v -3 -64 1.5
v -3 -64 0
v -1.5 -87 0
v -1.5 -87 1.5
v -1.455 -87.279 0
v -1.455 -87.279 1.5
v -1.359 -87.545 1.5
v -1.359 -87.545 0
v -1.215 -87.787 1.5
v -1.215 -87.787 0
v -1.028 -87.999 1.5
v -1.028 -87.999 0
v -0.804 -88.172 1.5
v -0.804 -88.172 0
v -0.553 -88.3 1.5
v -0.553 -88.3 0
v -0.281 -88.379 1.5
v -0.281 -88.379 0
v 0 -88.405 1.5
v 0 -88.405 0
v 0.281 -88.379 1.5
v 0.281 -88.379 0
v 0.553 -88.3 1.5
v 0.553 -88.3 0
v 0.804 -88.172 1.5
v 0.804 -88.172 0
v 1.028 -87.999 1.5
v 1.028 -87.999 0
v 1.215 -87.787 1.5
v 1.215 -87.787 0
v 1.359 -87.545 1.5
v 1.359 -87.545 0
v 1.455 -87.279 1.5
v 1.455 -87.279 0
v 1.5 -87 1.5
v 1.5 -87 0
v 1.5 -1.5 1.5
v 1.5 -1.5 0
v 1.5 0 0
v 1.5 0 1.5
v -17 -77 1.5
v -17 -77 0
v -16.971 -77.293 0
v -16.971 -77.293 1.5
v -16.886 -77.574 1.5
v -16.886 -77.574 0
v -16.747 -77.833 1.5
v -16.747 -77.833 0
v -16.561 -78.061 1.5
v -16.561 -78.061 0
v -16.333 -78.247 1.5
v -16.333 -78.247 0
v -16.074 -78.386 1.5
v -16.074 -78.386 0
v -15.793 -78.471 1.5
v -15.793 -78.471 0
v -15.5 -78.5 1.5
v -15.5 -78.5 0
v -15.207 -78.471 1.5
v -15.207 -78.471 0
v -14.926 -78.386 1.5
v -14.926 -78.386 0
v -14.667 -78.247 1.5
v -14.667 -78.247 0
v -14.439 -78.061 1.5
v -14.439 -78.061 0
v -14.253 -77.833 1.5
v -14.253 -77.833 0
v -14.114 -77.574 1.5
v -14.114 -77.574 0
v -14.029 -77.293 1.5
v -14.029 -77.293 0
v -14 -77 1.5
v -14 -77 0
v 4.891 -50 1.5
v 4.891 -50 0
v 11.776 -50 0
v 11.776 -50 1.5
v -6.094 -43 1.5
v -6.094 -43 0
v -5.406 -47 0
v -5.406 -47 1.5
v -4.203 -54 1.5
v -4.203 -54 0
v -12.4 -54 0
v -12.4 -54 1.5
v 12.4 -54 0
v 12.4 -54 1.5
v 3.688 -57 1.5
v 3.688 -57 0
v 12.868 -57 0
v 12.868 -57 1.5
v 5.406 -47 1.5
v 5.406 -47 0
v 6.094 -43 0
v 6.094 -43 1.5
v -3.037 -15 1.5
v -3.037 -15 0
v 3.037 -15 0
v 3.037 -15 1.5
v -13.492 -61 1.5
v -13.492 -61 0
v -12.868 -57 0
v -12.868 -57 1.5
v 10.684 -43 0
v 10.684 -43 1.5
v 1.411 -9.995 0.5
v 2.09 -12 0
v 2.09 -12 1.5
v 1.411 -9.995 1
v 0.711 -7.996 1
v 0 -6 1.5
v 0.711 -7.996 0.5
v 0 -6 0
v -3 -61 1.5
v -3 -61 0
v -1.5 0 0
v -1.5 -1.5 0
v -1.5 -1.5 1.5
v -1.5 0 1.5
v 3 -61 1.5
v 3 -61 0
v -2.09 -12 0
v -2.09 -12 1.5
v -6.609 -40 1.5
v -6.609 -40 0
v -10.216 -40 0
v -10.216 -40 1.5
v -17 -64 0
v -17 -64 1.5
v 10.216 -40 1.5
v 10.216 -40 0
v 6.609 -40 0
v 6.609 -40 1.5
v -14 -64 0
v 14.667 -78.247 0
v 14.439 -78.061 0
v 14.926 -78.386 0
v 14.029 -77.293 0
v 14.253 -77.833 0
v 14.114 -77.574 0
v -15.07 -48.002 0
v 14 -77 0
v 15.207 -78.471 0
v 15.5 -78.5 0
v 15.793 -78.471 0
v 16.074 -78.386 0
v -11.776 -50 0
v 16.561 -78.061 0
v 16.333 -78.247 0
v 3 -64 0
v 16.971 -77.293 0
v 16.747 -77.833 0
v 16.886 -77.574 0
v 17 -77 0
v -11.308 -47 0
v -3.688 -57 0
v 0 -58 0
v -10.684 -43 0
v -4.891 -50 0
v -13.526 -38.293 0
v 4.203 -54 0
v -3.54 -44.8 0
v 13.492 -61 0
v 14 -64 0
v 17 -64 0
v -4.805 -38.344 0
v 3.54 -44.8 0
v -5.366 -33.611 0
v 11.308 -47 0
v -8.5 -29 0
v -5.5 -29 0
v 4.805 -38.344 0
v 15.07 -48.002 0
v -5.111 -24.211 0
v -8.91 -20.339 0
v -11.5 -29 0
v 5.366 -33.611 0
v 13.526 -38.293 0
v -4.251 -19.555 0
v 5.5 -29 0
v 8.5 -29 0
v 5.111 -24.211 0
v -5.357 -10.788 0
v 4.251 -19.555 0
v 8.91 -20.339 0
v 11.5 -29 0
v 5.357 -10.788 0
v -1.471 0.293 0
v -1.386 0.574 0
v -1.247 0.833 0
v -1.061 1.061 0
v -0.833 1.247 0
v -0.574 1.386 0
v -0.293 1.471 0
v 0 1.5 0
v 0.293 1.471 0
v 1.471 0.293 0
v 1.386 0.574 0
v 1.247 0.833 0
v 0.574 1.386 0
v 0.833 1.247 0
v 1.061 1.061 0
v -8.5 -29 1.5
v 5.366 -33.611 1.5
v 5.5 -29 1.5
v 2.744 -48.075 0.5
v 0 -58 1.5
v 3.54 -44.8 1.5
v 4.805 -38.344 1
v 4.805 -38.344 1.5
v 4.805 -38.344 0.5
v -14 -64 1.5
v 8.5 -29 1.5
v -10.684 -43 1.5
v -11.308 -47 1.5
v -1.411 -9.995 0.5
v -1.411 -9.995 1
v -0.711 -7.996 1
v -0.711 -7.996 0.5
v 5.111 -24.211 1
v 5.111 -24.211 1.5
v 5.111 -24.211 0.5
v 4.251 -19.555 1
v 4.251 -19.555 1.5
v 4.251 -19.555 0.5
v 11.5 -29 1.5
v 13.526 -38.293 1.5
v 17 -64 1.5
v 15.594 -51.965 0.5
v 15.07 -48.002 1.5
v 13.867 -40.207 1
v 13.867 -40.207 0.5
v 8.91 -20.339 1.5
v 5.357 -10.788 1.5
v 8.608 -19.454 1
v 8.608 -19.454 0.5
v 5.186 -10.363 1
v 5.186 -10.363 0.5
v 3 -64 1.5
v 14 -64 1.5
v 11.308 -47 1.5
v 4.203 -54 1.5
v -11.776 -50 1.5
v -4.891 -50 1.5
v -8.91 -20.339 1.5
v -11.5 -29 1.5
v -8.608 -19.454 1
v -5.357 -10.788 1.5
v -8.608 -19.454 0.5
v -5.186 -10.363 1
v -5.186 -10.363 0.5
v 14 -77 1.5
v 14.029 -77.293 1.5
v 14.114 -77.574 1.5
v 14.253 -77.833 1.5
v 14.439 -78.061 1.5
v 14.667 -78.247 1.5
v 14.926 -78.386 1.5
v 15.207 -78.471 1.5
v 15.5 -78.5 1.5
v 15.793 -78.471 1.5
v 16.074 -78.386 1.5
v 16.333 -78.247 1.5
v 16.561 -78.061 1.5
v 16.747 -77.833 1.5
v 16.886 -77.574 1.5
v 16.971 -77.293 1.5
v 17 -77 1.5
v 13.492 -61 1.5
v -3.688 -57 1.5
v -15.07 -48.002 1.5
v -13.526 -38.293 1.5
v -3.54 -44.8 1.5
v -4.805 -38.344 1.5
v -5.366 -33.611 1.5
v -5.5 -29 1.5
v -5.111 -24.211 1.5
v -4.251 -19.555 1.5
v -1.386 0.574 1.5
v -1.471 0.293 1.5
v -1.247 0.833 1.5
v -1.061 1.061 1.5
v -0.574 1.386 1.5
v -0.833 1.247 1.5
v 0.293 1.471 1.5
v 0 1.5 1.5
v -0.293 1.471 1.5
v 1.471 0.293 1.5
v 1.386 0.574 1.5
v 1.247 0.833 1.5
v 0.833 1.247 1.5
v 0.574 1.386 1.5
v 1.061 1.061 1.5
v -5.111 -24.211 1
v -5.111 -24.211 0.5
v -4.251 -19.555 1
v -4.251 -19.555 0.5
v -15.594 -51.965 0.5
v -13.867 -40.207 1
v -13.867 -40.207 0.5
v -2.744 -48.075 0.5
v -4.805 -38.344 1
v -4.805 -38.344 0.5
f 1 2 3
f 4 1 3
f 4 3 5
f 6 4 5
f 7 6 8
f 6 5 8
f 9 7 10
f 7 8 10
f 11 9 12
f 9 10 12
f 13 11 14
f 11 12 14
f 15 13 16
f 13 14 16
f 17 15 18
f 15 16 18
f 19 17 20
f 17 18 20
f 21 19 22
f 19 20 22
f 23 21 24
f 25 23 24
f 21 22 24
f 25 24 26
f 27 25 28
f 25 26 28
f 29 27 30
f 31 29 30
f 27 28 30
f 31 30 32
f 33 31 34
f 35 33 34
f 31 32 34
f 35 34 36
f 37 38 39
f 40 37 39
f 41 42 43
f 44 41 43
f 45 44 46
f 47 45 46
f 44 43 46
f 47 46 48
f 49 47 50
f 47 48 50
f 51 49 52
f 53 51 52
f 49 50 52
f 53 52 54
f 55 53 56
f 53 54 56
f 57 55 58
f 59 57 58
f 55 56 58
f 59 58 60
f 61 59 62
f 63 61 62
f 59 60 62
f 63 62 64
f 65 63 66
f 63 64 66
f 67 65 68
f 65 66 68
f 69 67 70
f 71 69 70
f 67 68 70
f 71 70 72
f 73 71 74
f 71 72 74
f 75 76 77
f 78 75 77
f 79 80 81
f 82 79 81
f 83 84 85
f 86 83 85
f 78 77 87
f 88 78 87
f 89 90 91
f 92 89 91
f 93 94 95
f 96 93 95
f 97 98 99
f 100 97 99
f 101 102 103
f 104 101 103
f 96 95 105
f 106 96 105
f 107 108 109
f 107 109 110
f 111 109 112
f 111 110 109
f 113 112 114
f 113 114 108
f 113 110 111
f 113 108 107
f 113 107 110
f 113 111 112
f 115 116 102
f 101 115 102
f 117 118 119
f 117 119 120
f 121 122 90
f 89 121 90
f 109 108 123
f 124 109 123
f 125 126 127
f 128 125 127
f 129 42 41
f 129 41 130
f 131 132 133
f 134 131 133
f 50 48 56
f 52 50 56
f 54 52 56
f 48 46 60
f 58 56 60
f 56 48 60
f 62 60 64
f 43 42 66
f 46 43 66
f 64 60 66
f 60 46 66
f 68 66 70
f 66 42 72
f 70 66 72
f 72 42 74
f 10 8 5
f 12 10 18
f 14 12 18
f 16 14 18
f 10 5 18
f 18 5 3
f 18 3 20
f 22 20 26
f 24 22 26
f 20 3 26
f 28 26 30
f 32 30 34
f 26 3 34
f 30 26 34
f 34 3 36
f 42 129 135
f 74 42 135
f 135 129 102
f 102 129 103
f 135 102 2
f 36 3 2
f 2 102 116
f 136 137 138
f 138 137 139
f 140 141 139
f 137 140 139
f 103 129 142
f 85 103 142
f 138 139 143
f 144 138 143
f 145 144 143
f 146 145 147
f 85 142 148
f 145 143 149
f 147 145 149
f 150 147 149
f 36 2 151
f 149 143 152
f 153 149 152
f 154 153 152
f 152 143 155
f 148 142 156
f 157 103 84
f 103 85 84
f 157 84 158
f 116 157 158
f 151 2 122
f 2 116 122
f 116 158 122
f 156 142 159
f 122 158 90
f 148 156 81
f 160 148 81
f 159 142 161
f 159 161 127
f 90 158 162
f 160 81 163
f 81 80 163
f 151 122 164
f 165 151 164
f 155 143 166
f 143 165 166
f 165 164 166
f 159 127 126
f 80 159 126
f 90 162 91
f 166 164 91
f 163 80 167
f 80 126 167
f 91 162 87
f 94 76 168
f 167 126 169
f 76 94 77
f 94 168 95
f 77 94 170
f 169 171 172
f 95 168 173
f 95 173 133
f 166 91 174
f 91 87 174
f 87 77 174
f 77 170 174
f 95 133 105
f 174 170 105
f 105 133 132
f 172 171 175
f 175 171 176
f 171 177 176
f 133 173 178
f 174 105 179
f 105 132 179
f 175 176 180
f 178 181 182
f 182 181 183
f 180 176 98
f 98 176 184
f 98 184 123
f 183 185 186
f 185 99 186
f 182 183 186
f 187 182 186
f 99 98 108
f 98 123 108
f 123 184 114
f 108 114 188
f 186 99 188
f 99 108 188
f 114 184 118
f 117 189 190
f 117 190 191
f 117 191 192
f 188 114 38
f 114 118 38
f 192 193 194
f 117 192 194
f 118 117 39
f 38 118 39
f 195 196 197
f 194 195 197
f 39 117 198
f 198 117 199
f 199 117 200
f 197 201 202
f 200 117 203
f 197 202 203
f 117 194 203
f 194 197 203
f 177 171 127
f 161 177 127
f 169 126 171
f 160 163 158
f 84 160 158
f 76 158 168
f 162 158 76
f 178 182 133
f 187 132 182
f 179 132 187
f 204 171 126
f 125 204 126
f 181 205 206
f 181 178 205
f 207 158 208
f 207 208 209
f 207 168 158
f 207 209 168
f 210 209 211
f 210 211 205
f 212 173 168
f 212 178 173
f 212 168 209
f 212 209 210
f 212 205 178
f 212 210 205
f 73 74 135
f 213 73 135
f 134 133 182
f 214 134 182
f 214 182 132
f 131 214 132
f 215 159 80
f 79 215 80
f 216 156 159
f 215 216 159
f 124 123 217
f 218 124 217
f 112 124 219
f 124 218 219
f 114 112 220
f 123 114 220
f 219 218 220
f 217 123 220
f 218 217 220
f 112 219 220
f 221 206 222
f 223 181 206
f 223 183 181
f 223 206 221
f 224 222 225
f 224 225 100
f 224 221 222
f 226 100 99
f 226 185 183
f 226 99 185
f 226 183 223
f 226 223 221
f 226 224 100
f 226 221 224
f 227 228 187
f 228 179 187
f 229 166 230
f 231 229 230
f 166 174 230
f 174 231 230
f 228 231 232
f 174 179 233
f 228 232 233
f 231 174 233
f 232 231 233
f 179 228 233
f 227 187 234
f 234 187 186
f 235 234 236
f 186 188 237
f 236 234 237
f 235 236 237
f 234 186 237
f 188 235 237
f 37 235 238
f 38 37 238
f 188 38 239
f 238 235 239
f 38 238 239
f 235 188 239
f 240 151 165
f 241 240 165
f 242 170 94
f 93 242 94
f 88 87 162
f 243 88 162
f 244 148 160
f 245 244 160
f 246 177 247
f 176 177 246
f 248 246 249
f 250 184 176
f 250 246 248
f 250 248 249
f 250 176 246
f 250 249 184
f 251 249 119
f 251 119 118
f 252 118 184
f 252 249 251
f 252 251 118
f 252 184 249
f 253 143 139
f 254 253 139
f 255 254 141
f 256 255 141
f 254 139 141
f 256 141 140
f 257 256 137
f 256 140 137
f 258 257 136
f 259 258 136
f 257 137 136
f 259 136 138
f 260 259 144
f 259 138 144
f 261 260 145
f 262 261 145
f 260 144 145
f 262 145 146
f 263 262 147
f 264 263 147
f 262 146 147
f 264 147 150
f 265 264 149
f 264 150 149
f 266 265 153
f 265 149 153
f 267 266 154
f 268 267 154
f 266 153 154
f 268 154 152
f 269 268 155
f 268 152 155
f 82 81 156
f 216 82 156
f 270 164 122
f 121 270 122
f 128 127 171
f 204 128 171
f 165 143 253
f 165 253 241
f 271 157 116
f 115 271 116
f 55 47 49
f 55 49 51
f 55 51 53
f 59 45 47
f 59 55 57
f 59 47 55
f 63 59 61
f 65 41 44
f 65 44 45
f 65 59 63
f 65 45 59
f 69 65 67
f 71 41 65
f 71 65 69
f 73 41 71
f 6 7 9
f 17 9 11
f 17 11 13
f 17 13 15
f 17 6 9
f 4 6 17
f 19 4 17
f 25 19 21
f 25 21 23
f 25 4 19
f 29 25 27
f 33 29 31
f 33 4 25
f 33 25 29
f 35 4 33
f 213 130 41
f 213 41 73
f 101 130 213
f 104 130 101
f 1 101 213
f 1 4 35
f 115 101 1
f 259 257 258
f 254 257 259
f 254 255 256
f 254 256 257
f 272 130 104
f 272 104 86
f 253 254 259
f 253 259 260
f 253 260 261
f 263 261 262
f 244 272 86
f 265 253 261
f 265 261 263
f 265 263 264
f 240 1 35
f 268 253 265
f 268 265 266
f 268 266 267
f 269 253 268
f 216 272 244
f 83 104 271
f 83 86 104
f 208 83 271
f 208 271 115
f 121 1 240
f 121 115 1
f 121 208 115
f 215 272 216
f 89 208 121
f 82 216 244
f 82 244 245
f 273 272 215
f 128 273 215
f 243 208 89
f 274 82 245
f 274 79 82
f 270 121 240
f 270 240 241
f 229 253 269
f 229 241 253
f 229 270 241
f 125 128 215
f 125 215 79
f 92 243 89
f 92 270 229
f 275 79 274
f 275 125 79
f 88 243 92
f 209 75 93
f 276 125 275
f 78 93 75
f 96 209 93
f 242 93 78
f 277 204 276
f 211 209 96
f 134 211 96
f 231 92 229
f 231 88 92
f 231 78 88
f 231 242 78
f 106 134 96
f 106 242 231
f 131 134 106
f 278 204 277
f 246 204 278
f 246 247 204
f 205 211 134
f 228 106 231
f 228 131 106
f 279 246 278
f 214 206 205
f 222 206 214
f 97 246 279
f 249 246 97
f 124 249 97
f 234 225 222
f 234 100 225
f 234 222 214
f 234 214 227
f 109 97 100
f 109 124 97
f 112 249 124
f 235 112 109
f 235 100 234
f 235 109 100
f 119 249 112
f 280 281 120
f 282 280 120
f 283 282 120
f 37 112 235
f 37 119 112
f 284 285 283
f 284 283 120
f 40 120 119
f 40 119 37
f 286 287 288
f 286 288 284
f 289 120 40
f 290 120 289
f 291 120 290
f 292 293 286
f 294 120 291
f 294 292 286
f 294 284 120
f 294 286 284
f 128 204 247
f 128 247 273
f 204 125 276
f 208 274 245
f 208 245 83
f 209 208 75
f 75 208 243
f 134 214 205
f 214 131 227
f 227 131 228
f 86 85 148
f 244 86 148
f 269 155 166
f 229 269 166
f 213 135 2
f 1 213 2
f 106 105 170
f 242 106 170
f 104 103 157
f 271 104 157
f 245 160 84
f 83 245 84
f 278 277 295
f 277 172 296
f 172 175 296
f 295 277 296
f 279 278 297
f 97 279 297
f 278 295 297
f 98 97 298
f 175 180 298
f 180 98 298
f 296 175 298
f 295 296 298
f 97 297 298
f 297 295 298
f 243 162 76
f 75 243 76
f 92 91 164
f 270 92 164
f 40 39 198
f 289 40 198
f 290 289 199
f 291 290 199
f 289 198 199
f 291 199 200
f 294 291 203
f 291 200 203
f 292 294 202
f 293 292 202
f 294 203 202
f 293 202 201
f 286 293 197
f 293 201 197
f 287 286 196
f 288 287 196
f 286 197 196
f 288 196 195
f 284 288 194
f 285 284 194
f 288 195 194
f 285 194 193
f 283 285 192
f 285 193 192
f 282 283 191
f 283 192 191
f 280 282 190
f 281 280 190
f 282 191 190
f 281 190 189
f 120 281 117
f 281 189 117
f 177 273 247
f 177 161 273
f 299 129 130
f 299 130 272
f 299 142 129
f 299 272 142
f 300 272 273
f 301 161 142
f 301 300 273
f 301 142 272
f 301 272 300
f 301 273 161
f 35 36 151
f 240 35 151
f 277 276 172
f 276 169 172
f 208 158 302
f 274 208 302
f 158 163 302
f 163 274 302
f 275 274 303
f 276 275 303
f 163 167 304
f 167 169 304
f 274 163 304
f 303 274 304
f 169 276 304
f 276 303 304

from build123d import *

# Parameters (mm, degrees)
F0_W     = 1.5
F0_H     = 1.5
F0_W_2   = 3
F0_H_2   = 13
F1_DEPTH = 1.5


with BuildPart() as f1:
    # F0 (on Top) → F1 (new body)
    with BuildSketch(Plane.XY):
        with BuildLine():
            ThreePointArc((1.5, 0), (0, 1.5), (-1.5, 0))
            Line((-1.5, 0), (0, 0))
            Line((0, 0), (1.5, 0))
        make_face()
        with Locations((-0.75, -0.75)):
            Rectangle(F0_W, F0_H)
        with Locations((0.75, -0.75)):
            Rectangle(F0_W, F0_H)
        with BuildLine():
            Line((-11.5, -29), (-1.5, -1.5))
            add(Edge.make_bspline(
                [(-11.5, -29), (-8.9604389689, -19.1496475307), (-5.2302194845, -10.3248237653), (-1.5, -1.5)],
                knots=[0.5238897737, 0.5238897737, 0.5238897737, 0.5238897737, 1, 1, 1, 1], degree=3))
        make_face()
        with BuildLine():
            Line((0, -1.5), (-1.5, -1.5))
            Line((-1.5, -1.5), (-11.5, -29))
            Line((-11.5, -29), (-8.5, -29))
            Line((-8.5, -29), (-5.5, -29))
            add(Edge.make_bspline(
                [(-5.5, -29), (-5.3848916098, -24.1330760329), (-4.3881653739, -19.5163140054), (-3.0374413678, -15)],
                knots=[0.5276799434, 0.5276799434, 0.5276799434, 0.5276799434, 0.8103483866, 0.8103483866, 0.8103483866, 0.8103483866], degree=3))
            add(Edge.make_bspline(
                [(-3.0374413678, -15), (-2.7370430221, -13.9955807036), (-2.4191356353, -12.9961296547), (-2.0895230291, -12)],
                knots=[0.8103483866, 0.8103483866, 0.8103483866, 0.8103483866, 0.8732132889, 0.8732132889, 0.8732132889, 0.8732132889], degree=3))
            add(Edge.make_bspline(
                [(-2.0895230291, -12), (-1.4247562559, -9.9909934152), (-0.7123781279, -7.9954967076), (0, -6)],
                knots=[0.8732132889, 0.8732132889, 0.8732132889, 0.8732132889, 1, 1, 1, 1], degree=3))
            Line((0, -6), (0, -1.5))
        make_face()
        with BuildLine():
            Line((-2.152173913, -15), (-1.4347826087, -12))
            Line((-1.4347826087, -12), (-2.0895230291, -12))
            add(Edge.make_bspline(
                [(-3.0374413678, -15), (-2.7370430221, -13.9955807036), (-2.4191356353, -12.9961296547), (-2.0895230291, -12)],
                knots=[0.8103483866, 0.8103483866, 0.8103483866, 0.8103483866, 0.8732132889, 0.8732132889, 0.8732132889, 0.8732132889], degree=3))
            Line((-3.0374413678, -15), (-2.152173913, -15))
        make_face()
        Polygon((0, -15), (0, -12), (-1.4347826087, -12), (-2.152173913, -15), align=None)
        Polygon((1.4347826087, -12), (0, -12), (0, -15), (2.152173913, -15), align=None)
        with BuildLine():
            Line((2.0895230291, -12), (1.4347826087, -12))
            Line((1.4347826087, -12), (2.152173913, -15))
            Line((2.152173913, -15), (3.0374413678, -15))
            add(Edge.make_bspline(
                [(3.0374413678, -15), (2.7370430221, -13.9955807036), (2.4191356353, -12.9961296547), (2.0895230291, -12)],
                knots=[0.8103483866, 0.8103483866, 0.8103483866, 0.8103483866, 0.8732132889, 0.8732132889, 0.8732132889, 0.8732132889], degree=3))
        make_face()
        with BuildLine():
            add(Edge.make_bspline(
                [(11.5, -29), (8.9604389689, -19.1496475307), (5.2302194845, -10.3248237653), (1.5, -1.5)],
                knots=[0.5238897737, 0.5238897737, 0.5238897737, 0.5238897737, 1, 1, 1, 1], degree=3))
            Line((1.5, -1.5), (11.5, -29))
        make_face()
        with BuildLine():
            Line((1.5, -1.5), (0, -1.5))
            Line((0, -1.5), (0, -6))
            add(Edge.make_bspline(
                [(2.0895230291, -12), (1.4247562559, -9.9909934152), (0.7123781279, -7.9954967076), (0, -6)],
                knots=[0.8732132889, 0.8732132889, 0.8732132889, 0.8732132889, 1, 1, 1, 1], degree=3))
            add(Edge.make_bspline(
                [(3.0374413678, -15), (2.7370430221, -13.9955807036), (2.4191356353, -12.9961296547), (2.0895230291, -12)],
                knots=[0.8103483866, 0.8103483866, 0.8103483866, 0.8103483866, 0.8732132889, 0.8732132889, 0.8732132889, 0.8732132889], degree=3))
            add(Edge.make_bspline(
                [(5.5, -29), (5.3848916098, -24.1330760329), (4.3881653739, -19.5163140054), (3.0374413678, -15)],
                knots=[0.5276799434, 0.5276799434, 0.5276799434, 0.5276799434, 0.8103483866, 0.8103483866, 0.8103483866, 0.8103483866], degree=3))
            Line((5.5, -29), (8.5, -29))
            Line((8.5, -29), (11.5, -29))
            Line((11.5, -29), (1.5, -1.5))
        make_face()
        with BuildLine():
            Line((-8.5, -29), (-11.5, -29))
            Line((-11.5, -29), (-17, -64))
            Line((-17, -64), (-14, -64))
            Line((-14, -64), (-3, -64))
            Line((-3, -64), (0, -64))
            Line((0, -64), (0, -58))
            add(Edge.make_bspline(
                [(0, -58), (-2.8574410503, -48.0427394279), (-5.7148821006, -38.0854788558), (-5.5, -29)],
                knots=[0, 0, 0, 0, 0.5276799434, 0.5276799434, 0.5276799434, 0.5276799434], degree=3))
            Line((-5.5, -29), (-8.5, -29))
        make_face()
        Polygon((-10.2159162976, -40), (-8.5, -29), (-6.609375, -40), (-6.09375, -43), (-5.40625, -47), (-4.890625, -50), (-4.203125, -54), (-3.6875, -57), (-3, -61), (-8.5, -61), (-13.491756502, -61), (-12.8677869393, -57), (-12.3998097672, -54), (-11.7758402045, -50), (-11.3078630324, -47), (-10.6838934696, -43), align=None, mode=Mode.SUBTRACT)
        with BuildLine():
            Line((-17, -64), (-11.5, -29))
            add(Edge.make_bspline(
                [(-17, -64), (-15.6472080207, -51.9194371815), (-14.2944160413, -39.838874363), (-11.5, -29)],
                knots=[0, 0, 0, 0, 0.5238897737, 0.5238897737, 0.5238897737, 0.5238897737], degree=3))
        make_face()
        with BuildLine():
            Line((17, -64), (11.5, -29))
            Line((11.5, -29), (8.5, -29))
            Line((8.5, -29), (5.5, -29))
            add(Edge.make_bspline(
                [(0, -58), (2.8574410503, -48.0427394279), (5.7148821006, -38.0854788558), (5.5, -29)],
                knots=[0, 0, 0, 0, 0.5276799434, 0.5276799434, 0.5276799434, 0.5276799434], degree=3))
            Line((0, -58), (0, -64))
            Line((0, -64), (3, -64))
            Line((3, -64), (14, -64))
            Line((14, -64), (17, -64))
        make_face()
        Polygon((6.609375, -40), (8.5, -29), (10.2159162976, -40), (10.6838934696, -43), (11.3078630324, -47), (11.7758402045, -50), (12.3998097672, -54), (12.8677869393, -57), (13.491756502, -61), (3, -61), (3.6875, -57), (4.203125, -54), (4.890625, -50), (5.40625, -47), (6.09375, -43), align=None, mode=Mode.SUBTRACT)
        with BuildLine():
            add(Edge.make_bspline(
                [(17, -64), (15.6472080207, -51.9194371815), (14.2944160413, -39.838874363), (11.5, -29)],
                knots=[0, 0, 0, 0, 0.5238897737, 0.5238897737, 0.5238897737, 0.5238897737], degree=3))
            Line((11.5, -29), (17, -64))
        make_face()
        Polygon((10.6838934696, -43), (10.2159162976, -40), (6.609375, -40), (6.09375, -43), align=None)
        Polygon((11.7758402045, -50), (11.3078630324, -47), (5.40625, -47), (4.890625, -50), align=None)
        Polygon((12.8677869393, -57), (12.3998097672, -54), (4.203125, -54), (3.6875, -57), align=None)
        Polygon((-8.5, -54), (-12.3998097672, -54), (-12.8677869393, -57), (-8.5, -57), align=None)
        Polygon((-3.6875, -57), (-4.203125, -54), (-8.5, -54), (-8.5, -57), align=None)
        Polygon((-4.890625, -50), (-5.40625, -47), (-8.5, -47), (-8.5, -50), align=None)
        Polygon((-8.5, -47), (-11.3078630324, -47), (-11.7758402045, -50), (-8.5, -50), align=None)
        Polygon((-8.5, -40), (-10.2159162976, -40), (-10.6838934696, -43), (-8.5, -43), align=None)
        Polygon((-6.09375, -43), (-6.609375, -40), (-8.5, -40), (-8.5, -43), align=None)
        with Locations((-15.5, -70.5)):
            Rectangle(F0_W_2, F0_H_2)
        Polygon((0, -64), (-3, -64), (-1.5, -87), (0, -87), align=None)
        with Locations((15.5, -70.5)):
            Rectangle(F0_W_2, F0_H_2)
        Polygon((1.5, -87), (3, -64), (0, -64), (0, -87), align=None)
        with BuildLine():
            ThreePointArc((14, -77), (15.5, -78.5), (17, -77))
            Line((17, -77), (14, -77))
        make_face()
        with BuildLine():
            Line((-14, -77), (-17, -77))
            ThreePointArc((-17, -77), (-15.5, -78.5), (-14, -77))
        make_face()
        with BuildLine():
            Line((0, -87), (-1.5, -87))
            ThreePointArc((-1.5, -87), (0, -88.4053605093), (1.5, -87))
            Line((1.5, -87), (0, -87))
        make_face()
    extrude(amount=F1_DEPTH)


solid = f1.part
